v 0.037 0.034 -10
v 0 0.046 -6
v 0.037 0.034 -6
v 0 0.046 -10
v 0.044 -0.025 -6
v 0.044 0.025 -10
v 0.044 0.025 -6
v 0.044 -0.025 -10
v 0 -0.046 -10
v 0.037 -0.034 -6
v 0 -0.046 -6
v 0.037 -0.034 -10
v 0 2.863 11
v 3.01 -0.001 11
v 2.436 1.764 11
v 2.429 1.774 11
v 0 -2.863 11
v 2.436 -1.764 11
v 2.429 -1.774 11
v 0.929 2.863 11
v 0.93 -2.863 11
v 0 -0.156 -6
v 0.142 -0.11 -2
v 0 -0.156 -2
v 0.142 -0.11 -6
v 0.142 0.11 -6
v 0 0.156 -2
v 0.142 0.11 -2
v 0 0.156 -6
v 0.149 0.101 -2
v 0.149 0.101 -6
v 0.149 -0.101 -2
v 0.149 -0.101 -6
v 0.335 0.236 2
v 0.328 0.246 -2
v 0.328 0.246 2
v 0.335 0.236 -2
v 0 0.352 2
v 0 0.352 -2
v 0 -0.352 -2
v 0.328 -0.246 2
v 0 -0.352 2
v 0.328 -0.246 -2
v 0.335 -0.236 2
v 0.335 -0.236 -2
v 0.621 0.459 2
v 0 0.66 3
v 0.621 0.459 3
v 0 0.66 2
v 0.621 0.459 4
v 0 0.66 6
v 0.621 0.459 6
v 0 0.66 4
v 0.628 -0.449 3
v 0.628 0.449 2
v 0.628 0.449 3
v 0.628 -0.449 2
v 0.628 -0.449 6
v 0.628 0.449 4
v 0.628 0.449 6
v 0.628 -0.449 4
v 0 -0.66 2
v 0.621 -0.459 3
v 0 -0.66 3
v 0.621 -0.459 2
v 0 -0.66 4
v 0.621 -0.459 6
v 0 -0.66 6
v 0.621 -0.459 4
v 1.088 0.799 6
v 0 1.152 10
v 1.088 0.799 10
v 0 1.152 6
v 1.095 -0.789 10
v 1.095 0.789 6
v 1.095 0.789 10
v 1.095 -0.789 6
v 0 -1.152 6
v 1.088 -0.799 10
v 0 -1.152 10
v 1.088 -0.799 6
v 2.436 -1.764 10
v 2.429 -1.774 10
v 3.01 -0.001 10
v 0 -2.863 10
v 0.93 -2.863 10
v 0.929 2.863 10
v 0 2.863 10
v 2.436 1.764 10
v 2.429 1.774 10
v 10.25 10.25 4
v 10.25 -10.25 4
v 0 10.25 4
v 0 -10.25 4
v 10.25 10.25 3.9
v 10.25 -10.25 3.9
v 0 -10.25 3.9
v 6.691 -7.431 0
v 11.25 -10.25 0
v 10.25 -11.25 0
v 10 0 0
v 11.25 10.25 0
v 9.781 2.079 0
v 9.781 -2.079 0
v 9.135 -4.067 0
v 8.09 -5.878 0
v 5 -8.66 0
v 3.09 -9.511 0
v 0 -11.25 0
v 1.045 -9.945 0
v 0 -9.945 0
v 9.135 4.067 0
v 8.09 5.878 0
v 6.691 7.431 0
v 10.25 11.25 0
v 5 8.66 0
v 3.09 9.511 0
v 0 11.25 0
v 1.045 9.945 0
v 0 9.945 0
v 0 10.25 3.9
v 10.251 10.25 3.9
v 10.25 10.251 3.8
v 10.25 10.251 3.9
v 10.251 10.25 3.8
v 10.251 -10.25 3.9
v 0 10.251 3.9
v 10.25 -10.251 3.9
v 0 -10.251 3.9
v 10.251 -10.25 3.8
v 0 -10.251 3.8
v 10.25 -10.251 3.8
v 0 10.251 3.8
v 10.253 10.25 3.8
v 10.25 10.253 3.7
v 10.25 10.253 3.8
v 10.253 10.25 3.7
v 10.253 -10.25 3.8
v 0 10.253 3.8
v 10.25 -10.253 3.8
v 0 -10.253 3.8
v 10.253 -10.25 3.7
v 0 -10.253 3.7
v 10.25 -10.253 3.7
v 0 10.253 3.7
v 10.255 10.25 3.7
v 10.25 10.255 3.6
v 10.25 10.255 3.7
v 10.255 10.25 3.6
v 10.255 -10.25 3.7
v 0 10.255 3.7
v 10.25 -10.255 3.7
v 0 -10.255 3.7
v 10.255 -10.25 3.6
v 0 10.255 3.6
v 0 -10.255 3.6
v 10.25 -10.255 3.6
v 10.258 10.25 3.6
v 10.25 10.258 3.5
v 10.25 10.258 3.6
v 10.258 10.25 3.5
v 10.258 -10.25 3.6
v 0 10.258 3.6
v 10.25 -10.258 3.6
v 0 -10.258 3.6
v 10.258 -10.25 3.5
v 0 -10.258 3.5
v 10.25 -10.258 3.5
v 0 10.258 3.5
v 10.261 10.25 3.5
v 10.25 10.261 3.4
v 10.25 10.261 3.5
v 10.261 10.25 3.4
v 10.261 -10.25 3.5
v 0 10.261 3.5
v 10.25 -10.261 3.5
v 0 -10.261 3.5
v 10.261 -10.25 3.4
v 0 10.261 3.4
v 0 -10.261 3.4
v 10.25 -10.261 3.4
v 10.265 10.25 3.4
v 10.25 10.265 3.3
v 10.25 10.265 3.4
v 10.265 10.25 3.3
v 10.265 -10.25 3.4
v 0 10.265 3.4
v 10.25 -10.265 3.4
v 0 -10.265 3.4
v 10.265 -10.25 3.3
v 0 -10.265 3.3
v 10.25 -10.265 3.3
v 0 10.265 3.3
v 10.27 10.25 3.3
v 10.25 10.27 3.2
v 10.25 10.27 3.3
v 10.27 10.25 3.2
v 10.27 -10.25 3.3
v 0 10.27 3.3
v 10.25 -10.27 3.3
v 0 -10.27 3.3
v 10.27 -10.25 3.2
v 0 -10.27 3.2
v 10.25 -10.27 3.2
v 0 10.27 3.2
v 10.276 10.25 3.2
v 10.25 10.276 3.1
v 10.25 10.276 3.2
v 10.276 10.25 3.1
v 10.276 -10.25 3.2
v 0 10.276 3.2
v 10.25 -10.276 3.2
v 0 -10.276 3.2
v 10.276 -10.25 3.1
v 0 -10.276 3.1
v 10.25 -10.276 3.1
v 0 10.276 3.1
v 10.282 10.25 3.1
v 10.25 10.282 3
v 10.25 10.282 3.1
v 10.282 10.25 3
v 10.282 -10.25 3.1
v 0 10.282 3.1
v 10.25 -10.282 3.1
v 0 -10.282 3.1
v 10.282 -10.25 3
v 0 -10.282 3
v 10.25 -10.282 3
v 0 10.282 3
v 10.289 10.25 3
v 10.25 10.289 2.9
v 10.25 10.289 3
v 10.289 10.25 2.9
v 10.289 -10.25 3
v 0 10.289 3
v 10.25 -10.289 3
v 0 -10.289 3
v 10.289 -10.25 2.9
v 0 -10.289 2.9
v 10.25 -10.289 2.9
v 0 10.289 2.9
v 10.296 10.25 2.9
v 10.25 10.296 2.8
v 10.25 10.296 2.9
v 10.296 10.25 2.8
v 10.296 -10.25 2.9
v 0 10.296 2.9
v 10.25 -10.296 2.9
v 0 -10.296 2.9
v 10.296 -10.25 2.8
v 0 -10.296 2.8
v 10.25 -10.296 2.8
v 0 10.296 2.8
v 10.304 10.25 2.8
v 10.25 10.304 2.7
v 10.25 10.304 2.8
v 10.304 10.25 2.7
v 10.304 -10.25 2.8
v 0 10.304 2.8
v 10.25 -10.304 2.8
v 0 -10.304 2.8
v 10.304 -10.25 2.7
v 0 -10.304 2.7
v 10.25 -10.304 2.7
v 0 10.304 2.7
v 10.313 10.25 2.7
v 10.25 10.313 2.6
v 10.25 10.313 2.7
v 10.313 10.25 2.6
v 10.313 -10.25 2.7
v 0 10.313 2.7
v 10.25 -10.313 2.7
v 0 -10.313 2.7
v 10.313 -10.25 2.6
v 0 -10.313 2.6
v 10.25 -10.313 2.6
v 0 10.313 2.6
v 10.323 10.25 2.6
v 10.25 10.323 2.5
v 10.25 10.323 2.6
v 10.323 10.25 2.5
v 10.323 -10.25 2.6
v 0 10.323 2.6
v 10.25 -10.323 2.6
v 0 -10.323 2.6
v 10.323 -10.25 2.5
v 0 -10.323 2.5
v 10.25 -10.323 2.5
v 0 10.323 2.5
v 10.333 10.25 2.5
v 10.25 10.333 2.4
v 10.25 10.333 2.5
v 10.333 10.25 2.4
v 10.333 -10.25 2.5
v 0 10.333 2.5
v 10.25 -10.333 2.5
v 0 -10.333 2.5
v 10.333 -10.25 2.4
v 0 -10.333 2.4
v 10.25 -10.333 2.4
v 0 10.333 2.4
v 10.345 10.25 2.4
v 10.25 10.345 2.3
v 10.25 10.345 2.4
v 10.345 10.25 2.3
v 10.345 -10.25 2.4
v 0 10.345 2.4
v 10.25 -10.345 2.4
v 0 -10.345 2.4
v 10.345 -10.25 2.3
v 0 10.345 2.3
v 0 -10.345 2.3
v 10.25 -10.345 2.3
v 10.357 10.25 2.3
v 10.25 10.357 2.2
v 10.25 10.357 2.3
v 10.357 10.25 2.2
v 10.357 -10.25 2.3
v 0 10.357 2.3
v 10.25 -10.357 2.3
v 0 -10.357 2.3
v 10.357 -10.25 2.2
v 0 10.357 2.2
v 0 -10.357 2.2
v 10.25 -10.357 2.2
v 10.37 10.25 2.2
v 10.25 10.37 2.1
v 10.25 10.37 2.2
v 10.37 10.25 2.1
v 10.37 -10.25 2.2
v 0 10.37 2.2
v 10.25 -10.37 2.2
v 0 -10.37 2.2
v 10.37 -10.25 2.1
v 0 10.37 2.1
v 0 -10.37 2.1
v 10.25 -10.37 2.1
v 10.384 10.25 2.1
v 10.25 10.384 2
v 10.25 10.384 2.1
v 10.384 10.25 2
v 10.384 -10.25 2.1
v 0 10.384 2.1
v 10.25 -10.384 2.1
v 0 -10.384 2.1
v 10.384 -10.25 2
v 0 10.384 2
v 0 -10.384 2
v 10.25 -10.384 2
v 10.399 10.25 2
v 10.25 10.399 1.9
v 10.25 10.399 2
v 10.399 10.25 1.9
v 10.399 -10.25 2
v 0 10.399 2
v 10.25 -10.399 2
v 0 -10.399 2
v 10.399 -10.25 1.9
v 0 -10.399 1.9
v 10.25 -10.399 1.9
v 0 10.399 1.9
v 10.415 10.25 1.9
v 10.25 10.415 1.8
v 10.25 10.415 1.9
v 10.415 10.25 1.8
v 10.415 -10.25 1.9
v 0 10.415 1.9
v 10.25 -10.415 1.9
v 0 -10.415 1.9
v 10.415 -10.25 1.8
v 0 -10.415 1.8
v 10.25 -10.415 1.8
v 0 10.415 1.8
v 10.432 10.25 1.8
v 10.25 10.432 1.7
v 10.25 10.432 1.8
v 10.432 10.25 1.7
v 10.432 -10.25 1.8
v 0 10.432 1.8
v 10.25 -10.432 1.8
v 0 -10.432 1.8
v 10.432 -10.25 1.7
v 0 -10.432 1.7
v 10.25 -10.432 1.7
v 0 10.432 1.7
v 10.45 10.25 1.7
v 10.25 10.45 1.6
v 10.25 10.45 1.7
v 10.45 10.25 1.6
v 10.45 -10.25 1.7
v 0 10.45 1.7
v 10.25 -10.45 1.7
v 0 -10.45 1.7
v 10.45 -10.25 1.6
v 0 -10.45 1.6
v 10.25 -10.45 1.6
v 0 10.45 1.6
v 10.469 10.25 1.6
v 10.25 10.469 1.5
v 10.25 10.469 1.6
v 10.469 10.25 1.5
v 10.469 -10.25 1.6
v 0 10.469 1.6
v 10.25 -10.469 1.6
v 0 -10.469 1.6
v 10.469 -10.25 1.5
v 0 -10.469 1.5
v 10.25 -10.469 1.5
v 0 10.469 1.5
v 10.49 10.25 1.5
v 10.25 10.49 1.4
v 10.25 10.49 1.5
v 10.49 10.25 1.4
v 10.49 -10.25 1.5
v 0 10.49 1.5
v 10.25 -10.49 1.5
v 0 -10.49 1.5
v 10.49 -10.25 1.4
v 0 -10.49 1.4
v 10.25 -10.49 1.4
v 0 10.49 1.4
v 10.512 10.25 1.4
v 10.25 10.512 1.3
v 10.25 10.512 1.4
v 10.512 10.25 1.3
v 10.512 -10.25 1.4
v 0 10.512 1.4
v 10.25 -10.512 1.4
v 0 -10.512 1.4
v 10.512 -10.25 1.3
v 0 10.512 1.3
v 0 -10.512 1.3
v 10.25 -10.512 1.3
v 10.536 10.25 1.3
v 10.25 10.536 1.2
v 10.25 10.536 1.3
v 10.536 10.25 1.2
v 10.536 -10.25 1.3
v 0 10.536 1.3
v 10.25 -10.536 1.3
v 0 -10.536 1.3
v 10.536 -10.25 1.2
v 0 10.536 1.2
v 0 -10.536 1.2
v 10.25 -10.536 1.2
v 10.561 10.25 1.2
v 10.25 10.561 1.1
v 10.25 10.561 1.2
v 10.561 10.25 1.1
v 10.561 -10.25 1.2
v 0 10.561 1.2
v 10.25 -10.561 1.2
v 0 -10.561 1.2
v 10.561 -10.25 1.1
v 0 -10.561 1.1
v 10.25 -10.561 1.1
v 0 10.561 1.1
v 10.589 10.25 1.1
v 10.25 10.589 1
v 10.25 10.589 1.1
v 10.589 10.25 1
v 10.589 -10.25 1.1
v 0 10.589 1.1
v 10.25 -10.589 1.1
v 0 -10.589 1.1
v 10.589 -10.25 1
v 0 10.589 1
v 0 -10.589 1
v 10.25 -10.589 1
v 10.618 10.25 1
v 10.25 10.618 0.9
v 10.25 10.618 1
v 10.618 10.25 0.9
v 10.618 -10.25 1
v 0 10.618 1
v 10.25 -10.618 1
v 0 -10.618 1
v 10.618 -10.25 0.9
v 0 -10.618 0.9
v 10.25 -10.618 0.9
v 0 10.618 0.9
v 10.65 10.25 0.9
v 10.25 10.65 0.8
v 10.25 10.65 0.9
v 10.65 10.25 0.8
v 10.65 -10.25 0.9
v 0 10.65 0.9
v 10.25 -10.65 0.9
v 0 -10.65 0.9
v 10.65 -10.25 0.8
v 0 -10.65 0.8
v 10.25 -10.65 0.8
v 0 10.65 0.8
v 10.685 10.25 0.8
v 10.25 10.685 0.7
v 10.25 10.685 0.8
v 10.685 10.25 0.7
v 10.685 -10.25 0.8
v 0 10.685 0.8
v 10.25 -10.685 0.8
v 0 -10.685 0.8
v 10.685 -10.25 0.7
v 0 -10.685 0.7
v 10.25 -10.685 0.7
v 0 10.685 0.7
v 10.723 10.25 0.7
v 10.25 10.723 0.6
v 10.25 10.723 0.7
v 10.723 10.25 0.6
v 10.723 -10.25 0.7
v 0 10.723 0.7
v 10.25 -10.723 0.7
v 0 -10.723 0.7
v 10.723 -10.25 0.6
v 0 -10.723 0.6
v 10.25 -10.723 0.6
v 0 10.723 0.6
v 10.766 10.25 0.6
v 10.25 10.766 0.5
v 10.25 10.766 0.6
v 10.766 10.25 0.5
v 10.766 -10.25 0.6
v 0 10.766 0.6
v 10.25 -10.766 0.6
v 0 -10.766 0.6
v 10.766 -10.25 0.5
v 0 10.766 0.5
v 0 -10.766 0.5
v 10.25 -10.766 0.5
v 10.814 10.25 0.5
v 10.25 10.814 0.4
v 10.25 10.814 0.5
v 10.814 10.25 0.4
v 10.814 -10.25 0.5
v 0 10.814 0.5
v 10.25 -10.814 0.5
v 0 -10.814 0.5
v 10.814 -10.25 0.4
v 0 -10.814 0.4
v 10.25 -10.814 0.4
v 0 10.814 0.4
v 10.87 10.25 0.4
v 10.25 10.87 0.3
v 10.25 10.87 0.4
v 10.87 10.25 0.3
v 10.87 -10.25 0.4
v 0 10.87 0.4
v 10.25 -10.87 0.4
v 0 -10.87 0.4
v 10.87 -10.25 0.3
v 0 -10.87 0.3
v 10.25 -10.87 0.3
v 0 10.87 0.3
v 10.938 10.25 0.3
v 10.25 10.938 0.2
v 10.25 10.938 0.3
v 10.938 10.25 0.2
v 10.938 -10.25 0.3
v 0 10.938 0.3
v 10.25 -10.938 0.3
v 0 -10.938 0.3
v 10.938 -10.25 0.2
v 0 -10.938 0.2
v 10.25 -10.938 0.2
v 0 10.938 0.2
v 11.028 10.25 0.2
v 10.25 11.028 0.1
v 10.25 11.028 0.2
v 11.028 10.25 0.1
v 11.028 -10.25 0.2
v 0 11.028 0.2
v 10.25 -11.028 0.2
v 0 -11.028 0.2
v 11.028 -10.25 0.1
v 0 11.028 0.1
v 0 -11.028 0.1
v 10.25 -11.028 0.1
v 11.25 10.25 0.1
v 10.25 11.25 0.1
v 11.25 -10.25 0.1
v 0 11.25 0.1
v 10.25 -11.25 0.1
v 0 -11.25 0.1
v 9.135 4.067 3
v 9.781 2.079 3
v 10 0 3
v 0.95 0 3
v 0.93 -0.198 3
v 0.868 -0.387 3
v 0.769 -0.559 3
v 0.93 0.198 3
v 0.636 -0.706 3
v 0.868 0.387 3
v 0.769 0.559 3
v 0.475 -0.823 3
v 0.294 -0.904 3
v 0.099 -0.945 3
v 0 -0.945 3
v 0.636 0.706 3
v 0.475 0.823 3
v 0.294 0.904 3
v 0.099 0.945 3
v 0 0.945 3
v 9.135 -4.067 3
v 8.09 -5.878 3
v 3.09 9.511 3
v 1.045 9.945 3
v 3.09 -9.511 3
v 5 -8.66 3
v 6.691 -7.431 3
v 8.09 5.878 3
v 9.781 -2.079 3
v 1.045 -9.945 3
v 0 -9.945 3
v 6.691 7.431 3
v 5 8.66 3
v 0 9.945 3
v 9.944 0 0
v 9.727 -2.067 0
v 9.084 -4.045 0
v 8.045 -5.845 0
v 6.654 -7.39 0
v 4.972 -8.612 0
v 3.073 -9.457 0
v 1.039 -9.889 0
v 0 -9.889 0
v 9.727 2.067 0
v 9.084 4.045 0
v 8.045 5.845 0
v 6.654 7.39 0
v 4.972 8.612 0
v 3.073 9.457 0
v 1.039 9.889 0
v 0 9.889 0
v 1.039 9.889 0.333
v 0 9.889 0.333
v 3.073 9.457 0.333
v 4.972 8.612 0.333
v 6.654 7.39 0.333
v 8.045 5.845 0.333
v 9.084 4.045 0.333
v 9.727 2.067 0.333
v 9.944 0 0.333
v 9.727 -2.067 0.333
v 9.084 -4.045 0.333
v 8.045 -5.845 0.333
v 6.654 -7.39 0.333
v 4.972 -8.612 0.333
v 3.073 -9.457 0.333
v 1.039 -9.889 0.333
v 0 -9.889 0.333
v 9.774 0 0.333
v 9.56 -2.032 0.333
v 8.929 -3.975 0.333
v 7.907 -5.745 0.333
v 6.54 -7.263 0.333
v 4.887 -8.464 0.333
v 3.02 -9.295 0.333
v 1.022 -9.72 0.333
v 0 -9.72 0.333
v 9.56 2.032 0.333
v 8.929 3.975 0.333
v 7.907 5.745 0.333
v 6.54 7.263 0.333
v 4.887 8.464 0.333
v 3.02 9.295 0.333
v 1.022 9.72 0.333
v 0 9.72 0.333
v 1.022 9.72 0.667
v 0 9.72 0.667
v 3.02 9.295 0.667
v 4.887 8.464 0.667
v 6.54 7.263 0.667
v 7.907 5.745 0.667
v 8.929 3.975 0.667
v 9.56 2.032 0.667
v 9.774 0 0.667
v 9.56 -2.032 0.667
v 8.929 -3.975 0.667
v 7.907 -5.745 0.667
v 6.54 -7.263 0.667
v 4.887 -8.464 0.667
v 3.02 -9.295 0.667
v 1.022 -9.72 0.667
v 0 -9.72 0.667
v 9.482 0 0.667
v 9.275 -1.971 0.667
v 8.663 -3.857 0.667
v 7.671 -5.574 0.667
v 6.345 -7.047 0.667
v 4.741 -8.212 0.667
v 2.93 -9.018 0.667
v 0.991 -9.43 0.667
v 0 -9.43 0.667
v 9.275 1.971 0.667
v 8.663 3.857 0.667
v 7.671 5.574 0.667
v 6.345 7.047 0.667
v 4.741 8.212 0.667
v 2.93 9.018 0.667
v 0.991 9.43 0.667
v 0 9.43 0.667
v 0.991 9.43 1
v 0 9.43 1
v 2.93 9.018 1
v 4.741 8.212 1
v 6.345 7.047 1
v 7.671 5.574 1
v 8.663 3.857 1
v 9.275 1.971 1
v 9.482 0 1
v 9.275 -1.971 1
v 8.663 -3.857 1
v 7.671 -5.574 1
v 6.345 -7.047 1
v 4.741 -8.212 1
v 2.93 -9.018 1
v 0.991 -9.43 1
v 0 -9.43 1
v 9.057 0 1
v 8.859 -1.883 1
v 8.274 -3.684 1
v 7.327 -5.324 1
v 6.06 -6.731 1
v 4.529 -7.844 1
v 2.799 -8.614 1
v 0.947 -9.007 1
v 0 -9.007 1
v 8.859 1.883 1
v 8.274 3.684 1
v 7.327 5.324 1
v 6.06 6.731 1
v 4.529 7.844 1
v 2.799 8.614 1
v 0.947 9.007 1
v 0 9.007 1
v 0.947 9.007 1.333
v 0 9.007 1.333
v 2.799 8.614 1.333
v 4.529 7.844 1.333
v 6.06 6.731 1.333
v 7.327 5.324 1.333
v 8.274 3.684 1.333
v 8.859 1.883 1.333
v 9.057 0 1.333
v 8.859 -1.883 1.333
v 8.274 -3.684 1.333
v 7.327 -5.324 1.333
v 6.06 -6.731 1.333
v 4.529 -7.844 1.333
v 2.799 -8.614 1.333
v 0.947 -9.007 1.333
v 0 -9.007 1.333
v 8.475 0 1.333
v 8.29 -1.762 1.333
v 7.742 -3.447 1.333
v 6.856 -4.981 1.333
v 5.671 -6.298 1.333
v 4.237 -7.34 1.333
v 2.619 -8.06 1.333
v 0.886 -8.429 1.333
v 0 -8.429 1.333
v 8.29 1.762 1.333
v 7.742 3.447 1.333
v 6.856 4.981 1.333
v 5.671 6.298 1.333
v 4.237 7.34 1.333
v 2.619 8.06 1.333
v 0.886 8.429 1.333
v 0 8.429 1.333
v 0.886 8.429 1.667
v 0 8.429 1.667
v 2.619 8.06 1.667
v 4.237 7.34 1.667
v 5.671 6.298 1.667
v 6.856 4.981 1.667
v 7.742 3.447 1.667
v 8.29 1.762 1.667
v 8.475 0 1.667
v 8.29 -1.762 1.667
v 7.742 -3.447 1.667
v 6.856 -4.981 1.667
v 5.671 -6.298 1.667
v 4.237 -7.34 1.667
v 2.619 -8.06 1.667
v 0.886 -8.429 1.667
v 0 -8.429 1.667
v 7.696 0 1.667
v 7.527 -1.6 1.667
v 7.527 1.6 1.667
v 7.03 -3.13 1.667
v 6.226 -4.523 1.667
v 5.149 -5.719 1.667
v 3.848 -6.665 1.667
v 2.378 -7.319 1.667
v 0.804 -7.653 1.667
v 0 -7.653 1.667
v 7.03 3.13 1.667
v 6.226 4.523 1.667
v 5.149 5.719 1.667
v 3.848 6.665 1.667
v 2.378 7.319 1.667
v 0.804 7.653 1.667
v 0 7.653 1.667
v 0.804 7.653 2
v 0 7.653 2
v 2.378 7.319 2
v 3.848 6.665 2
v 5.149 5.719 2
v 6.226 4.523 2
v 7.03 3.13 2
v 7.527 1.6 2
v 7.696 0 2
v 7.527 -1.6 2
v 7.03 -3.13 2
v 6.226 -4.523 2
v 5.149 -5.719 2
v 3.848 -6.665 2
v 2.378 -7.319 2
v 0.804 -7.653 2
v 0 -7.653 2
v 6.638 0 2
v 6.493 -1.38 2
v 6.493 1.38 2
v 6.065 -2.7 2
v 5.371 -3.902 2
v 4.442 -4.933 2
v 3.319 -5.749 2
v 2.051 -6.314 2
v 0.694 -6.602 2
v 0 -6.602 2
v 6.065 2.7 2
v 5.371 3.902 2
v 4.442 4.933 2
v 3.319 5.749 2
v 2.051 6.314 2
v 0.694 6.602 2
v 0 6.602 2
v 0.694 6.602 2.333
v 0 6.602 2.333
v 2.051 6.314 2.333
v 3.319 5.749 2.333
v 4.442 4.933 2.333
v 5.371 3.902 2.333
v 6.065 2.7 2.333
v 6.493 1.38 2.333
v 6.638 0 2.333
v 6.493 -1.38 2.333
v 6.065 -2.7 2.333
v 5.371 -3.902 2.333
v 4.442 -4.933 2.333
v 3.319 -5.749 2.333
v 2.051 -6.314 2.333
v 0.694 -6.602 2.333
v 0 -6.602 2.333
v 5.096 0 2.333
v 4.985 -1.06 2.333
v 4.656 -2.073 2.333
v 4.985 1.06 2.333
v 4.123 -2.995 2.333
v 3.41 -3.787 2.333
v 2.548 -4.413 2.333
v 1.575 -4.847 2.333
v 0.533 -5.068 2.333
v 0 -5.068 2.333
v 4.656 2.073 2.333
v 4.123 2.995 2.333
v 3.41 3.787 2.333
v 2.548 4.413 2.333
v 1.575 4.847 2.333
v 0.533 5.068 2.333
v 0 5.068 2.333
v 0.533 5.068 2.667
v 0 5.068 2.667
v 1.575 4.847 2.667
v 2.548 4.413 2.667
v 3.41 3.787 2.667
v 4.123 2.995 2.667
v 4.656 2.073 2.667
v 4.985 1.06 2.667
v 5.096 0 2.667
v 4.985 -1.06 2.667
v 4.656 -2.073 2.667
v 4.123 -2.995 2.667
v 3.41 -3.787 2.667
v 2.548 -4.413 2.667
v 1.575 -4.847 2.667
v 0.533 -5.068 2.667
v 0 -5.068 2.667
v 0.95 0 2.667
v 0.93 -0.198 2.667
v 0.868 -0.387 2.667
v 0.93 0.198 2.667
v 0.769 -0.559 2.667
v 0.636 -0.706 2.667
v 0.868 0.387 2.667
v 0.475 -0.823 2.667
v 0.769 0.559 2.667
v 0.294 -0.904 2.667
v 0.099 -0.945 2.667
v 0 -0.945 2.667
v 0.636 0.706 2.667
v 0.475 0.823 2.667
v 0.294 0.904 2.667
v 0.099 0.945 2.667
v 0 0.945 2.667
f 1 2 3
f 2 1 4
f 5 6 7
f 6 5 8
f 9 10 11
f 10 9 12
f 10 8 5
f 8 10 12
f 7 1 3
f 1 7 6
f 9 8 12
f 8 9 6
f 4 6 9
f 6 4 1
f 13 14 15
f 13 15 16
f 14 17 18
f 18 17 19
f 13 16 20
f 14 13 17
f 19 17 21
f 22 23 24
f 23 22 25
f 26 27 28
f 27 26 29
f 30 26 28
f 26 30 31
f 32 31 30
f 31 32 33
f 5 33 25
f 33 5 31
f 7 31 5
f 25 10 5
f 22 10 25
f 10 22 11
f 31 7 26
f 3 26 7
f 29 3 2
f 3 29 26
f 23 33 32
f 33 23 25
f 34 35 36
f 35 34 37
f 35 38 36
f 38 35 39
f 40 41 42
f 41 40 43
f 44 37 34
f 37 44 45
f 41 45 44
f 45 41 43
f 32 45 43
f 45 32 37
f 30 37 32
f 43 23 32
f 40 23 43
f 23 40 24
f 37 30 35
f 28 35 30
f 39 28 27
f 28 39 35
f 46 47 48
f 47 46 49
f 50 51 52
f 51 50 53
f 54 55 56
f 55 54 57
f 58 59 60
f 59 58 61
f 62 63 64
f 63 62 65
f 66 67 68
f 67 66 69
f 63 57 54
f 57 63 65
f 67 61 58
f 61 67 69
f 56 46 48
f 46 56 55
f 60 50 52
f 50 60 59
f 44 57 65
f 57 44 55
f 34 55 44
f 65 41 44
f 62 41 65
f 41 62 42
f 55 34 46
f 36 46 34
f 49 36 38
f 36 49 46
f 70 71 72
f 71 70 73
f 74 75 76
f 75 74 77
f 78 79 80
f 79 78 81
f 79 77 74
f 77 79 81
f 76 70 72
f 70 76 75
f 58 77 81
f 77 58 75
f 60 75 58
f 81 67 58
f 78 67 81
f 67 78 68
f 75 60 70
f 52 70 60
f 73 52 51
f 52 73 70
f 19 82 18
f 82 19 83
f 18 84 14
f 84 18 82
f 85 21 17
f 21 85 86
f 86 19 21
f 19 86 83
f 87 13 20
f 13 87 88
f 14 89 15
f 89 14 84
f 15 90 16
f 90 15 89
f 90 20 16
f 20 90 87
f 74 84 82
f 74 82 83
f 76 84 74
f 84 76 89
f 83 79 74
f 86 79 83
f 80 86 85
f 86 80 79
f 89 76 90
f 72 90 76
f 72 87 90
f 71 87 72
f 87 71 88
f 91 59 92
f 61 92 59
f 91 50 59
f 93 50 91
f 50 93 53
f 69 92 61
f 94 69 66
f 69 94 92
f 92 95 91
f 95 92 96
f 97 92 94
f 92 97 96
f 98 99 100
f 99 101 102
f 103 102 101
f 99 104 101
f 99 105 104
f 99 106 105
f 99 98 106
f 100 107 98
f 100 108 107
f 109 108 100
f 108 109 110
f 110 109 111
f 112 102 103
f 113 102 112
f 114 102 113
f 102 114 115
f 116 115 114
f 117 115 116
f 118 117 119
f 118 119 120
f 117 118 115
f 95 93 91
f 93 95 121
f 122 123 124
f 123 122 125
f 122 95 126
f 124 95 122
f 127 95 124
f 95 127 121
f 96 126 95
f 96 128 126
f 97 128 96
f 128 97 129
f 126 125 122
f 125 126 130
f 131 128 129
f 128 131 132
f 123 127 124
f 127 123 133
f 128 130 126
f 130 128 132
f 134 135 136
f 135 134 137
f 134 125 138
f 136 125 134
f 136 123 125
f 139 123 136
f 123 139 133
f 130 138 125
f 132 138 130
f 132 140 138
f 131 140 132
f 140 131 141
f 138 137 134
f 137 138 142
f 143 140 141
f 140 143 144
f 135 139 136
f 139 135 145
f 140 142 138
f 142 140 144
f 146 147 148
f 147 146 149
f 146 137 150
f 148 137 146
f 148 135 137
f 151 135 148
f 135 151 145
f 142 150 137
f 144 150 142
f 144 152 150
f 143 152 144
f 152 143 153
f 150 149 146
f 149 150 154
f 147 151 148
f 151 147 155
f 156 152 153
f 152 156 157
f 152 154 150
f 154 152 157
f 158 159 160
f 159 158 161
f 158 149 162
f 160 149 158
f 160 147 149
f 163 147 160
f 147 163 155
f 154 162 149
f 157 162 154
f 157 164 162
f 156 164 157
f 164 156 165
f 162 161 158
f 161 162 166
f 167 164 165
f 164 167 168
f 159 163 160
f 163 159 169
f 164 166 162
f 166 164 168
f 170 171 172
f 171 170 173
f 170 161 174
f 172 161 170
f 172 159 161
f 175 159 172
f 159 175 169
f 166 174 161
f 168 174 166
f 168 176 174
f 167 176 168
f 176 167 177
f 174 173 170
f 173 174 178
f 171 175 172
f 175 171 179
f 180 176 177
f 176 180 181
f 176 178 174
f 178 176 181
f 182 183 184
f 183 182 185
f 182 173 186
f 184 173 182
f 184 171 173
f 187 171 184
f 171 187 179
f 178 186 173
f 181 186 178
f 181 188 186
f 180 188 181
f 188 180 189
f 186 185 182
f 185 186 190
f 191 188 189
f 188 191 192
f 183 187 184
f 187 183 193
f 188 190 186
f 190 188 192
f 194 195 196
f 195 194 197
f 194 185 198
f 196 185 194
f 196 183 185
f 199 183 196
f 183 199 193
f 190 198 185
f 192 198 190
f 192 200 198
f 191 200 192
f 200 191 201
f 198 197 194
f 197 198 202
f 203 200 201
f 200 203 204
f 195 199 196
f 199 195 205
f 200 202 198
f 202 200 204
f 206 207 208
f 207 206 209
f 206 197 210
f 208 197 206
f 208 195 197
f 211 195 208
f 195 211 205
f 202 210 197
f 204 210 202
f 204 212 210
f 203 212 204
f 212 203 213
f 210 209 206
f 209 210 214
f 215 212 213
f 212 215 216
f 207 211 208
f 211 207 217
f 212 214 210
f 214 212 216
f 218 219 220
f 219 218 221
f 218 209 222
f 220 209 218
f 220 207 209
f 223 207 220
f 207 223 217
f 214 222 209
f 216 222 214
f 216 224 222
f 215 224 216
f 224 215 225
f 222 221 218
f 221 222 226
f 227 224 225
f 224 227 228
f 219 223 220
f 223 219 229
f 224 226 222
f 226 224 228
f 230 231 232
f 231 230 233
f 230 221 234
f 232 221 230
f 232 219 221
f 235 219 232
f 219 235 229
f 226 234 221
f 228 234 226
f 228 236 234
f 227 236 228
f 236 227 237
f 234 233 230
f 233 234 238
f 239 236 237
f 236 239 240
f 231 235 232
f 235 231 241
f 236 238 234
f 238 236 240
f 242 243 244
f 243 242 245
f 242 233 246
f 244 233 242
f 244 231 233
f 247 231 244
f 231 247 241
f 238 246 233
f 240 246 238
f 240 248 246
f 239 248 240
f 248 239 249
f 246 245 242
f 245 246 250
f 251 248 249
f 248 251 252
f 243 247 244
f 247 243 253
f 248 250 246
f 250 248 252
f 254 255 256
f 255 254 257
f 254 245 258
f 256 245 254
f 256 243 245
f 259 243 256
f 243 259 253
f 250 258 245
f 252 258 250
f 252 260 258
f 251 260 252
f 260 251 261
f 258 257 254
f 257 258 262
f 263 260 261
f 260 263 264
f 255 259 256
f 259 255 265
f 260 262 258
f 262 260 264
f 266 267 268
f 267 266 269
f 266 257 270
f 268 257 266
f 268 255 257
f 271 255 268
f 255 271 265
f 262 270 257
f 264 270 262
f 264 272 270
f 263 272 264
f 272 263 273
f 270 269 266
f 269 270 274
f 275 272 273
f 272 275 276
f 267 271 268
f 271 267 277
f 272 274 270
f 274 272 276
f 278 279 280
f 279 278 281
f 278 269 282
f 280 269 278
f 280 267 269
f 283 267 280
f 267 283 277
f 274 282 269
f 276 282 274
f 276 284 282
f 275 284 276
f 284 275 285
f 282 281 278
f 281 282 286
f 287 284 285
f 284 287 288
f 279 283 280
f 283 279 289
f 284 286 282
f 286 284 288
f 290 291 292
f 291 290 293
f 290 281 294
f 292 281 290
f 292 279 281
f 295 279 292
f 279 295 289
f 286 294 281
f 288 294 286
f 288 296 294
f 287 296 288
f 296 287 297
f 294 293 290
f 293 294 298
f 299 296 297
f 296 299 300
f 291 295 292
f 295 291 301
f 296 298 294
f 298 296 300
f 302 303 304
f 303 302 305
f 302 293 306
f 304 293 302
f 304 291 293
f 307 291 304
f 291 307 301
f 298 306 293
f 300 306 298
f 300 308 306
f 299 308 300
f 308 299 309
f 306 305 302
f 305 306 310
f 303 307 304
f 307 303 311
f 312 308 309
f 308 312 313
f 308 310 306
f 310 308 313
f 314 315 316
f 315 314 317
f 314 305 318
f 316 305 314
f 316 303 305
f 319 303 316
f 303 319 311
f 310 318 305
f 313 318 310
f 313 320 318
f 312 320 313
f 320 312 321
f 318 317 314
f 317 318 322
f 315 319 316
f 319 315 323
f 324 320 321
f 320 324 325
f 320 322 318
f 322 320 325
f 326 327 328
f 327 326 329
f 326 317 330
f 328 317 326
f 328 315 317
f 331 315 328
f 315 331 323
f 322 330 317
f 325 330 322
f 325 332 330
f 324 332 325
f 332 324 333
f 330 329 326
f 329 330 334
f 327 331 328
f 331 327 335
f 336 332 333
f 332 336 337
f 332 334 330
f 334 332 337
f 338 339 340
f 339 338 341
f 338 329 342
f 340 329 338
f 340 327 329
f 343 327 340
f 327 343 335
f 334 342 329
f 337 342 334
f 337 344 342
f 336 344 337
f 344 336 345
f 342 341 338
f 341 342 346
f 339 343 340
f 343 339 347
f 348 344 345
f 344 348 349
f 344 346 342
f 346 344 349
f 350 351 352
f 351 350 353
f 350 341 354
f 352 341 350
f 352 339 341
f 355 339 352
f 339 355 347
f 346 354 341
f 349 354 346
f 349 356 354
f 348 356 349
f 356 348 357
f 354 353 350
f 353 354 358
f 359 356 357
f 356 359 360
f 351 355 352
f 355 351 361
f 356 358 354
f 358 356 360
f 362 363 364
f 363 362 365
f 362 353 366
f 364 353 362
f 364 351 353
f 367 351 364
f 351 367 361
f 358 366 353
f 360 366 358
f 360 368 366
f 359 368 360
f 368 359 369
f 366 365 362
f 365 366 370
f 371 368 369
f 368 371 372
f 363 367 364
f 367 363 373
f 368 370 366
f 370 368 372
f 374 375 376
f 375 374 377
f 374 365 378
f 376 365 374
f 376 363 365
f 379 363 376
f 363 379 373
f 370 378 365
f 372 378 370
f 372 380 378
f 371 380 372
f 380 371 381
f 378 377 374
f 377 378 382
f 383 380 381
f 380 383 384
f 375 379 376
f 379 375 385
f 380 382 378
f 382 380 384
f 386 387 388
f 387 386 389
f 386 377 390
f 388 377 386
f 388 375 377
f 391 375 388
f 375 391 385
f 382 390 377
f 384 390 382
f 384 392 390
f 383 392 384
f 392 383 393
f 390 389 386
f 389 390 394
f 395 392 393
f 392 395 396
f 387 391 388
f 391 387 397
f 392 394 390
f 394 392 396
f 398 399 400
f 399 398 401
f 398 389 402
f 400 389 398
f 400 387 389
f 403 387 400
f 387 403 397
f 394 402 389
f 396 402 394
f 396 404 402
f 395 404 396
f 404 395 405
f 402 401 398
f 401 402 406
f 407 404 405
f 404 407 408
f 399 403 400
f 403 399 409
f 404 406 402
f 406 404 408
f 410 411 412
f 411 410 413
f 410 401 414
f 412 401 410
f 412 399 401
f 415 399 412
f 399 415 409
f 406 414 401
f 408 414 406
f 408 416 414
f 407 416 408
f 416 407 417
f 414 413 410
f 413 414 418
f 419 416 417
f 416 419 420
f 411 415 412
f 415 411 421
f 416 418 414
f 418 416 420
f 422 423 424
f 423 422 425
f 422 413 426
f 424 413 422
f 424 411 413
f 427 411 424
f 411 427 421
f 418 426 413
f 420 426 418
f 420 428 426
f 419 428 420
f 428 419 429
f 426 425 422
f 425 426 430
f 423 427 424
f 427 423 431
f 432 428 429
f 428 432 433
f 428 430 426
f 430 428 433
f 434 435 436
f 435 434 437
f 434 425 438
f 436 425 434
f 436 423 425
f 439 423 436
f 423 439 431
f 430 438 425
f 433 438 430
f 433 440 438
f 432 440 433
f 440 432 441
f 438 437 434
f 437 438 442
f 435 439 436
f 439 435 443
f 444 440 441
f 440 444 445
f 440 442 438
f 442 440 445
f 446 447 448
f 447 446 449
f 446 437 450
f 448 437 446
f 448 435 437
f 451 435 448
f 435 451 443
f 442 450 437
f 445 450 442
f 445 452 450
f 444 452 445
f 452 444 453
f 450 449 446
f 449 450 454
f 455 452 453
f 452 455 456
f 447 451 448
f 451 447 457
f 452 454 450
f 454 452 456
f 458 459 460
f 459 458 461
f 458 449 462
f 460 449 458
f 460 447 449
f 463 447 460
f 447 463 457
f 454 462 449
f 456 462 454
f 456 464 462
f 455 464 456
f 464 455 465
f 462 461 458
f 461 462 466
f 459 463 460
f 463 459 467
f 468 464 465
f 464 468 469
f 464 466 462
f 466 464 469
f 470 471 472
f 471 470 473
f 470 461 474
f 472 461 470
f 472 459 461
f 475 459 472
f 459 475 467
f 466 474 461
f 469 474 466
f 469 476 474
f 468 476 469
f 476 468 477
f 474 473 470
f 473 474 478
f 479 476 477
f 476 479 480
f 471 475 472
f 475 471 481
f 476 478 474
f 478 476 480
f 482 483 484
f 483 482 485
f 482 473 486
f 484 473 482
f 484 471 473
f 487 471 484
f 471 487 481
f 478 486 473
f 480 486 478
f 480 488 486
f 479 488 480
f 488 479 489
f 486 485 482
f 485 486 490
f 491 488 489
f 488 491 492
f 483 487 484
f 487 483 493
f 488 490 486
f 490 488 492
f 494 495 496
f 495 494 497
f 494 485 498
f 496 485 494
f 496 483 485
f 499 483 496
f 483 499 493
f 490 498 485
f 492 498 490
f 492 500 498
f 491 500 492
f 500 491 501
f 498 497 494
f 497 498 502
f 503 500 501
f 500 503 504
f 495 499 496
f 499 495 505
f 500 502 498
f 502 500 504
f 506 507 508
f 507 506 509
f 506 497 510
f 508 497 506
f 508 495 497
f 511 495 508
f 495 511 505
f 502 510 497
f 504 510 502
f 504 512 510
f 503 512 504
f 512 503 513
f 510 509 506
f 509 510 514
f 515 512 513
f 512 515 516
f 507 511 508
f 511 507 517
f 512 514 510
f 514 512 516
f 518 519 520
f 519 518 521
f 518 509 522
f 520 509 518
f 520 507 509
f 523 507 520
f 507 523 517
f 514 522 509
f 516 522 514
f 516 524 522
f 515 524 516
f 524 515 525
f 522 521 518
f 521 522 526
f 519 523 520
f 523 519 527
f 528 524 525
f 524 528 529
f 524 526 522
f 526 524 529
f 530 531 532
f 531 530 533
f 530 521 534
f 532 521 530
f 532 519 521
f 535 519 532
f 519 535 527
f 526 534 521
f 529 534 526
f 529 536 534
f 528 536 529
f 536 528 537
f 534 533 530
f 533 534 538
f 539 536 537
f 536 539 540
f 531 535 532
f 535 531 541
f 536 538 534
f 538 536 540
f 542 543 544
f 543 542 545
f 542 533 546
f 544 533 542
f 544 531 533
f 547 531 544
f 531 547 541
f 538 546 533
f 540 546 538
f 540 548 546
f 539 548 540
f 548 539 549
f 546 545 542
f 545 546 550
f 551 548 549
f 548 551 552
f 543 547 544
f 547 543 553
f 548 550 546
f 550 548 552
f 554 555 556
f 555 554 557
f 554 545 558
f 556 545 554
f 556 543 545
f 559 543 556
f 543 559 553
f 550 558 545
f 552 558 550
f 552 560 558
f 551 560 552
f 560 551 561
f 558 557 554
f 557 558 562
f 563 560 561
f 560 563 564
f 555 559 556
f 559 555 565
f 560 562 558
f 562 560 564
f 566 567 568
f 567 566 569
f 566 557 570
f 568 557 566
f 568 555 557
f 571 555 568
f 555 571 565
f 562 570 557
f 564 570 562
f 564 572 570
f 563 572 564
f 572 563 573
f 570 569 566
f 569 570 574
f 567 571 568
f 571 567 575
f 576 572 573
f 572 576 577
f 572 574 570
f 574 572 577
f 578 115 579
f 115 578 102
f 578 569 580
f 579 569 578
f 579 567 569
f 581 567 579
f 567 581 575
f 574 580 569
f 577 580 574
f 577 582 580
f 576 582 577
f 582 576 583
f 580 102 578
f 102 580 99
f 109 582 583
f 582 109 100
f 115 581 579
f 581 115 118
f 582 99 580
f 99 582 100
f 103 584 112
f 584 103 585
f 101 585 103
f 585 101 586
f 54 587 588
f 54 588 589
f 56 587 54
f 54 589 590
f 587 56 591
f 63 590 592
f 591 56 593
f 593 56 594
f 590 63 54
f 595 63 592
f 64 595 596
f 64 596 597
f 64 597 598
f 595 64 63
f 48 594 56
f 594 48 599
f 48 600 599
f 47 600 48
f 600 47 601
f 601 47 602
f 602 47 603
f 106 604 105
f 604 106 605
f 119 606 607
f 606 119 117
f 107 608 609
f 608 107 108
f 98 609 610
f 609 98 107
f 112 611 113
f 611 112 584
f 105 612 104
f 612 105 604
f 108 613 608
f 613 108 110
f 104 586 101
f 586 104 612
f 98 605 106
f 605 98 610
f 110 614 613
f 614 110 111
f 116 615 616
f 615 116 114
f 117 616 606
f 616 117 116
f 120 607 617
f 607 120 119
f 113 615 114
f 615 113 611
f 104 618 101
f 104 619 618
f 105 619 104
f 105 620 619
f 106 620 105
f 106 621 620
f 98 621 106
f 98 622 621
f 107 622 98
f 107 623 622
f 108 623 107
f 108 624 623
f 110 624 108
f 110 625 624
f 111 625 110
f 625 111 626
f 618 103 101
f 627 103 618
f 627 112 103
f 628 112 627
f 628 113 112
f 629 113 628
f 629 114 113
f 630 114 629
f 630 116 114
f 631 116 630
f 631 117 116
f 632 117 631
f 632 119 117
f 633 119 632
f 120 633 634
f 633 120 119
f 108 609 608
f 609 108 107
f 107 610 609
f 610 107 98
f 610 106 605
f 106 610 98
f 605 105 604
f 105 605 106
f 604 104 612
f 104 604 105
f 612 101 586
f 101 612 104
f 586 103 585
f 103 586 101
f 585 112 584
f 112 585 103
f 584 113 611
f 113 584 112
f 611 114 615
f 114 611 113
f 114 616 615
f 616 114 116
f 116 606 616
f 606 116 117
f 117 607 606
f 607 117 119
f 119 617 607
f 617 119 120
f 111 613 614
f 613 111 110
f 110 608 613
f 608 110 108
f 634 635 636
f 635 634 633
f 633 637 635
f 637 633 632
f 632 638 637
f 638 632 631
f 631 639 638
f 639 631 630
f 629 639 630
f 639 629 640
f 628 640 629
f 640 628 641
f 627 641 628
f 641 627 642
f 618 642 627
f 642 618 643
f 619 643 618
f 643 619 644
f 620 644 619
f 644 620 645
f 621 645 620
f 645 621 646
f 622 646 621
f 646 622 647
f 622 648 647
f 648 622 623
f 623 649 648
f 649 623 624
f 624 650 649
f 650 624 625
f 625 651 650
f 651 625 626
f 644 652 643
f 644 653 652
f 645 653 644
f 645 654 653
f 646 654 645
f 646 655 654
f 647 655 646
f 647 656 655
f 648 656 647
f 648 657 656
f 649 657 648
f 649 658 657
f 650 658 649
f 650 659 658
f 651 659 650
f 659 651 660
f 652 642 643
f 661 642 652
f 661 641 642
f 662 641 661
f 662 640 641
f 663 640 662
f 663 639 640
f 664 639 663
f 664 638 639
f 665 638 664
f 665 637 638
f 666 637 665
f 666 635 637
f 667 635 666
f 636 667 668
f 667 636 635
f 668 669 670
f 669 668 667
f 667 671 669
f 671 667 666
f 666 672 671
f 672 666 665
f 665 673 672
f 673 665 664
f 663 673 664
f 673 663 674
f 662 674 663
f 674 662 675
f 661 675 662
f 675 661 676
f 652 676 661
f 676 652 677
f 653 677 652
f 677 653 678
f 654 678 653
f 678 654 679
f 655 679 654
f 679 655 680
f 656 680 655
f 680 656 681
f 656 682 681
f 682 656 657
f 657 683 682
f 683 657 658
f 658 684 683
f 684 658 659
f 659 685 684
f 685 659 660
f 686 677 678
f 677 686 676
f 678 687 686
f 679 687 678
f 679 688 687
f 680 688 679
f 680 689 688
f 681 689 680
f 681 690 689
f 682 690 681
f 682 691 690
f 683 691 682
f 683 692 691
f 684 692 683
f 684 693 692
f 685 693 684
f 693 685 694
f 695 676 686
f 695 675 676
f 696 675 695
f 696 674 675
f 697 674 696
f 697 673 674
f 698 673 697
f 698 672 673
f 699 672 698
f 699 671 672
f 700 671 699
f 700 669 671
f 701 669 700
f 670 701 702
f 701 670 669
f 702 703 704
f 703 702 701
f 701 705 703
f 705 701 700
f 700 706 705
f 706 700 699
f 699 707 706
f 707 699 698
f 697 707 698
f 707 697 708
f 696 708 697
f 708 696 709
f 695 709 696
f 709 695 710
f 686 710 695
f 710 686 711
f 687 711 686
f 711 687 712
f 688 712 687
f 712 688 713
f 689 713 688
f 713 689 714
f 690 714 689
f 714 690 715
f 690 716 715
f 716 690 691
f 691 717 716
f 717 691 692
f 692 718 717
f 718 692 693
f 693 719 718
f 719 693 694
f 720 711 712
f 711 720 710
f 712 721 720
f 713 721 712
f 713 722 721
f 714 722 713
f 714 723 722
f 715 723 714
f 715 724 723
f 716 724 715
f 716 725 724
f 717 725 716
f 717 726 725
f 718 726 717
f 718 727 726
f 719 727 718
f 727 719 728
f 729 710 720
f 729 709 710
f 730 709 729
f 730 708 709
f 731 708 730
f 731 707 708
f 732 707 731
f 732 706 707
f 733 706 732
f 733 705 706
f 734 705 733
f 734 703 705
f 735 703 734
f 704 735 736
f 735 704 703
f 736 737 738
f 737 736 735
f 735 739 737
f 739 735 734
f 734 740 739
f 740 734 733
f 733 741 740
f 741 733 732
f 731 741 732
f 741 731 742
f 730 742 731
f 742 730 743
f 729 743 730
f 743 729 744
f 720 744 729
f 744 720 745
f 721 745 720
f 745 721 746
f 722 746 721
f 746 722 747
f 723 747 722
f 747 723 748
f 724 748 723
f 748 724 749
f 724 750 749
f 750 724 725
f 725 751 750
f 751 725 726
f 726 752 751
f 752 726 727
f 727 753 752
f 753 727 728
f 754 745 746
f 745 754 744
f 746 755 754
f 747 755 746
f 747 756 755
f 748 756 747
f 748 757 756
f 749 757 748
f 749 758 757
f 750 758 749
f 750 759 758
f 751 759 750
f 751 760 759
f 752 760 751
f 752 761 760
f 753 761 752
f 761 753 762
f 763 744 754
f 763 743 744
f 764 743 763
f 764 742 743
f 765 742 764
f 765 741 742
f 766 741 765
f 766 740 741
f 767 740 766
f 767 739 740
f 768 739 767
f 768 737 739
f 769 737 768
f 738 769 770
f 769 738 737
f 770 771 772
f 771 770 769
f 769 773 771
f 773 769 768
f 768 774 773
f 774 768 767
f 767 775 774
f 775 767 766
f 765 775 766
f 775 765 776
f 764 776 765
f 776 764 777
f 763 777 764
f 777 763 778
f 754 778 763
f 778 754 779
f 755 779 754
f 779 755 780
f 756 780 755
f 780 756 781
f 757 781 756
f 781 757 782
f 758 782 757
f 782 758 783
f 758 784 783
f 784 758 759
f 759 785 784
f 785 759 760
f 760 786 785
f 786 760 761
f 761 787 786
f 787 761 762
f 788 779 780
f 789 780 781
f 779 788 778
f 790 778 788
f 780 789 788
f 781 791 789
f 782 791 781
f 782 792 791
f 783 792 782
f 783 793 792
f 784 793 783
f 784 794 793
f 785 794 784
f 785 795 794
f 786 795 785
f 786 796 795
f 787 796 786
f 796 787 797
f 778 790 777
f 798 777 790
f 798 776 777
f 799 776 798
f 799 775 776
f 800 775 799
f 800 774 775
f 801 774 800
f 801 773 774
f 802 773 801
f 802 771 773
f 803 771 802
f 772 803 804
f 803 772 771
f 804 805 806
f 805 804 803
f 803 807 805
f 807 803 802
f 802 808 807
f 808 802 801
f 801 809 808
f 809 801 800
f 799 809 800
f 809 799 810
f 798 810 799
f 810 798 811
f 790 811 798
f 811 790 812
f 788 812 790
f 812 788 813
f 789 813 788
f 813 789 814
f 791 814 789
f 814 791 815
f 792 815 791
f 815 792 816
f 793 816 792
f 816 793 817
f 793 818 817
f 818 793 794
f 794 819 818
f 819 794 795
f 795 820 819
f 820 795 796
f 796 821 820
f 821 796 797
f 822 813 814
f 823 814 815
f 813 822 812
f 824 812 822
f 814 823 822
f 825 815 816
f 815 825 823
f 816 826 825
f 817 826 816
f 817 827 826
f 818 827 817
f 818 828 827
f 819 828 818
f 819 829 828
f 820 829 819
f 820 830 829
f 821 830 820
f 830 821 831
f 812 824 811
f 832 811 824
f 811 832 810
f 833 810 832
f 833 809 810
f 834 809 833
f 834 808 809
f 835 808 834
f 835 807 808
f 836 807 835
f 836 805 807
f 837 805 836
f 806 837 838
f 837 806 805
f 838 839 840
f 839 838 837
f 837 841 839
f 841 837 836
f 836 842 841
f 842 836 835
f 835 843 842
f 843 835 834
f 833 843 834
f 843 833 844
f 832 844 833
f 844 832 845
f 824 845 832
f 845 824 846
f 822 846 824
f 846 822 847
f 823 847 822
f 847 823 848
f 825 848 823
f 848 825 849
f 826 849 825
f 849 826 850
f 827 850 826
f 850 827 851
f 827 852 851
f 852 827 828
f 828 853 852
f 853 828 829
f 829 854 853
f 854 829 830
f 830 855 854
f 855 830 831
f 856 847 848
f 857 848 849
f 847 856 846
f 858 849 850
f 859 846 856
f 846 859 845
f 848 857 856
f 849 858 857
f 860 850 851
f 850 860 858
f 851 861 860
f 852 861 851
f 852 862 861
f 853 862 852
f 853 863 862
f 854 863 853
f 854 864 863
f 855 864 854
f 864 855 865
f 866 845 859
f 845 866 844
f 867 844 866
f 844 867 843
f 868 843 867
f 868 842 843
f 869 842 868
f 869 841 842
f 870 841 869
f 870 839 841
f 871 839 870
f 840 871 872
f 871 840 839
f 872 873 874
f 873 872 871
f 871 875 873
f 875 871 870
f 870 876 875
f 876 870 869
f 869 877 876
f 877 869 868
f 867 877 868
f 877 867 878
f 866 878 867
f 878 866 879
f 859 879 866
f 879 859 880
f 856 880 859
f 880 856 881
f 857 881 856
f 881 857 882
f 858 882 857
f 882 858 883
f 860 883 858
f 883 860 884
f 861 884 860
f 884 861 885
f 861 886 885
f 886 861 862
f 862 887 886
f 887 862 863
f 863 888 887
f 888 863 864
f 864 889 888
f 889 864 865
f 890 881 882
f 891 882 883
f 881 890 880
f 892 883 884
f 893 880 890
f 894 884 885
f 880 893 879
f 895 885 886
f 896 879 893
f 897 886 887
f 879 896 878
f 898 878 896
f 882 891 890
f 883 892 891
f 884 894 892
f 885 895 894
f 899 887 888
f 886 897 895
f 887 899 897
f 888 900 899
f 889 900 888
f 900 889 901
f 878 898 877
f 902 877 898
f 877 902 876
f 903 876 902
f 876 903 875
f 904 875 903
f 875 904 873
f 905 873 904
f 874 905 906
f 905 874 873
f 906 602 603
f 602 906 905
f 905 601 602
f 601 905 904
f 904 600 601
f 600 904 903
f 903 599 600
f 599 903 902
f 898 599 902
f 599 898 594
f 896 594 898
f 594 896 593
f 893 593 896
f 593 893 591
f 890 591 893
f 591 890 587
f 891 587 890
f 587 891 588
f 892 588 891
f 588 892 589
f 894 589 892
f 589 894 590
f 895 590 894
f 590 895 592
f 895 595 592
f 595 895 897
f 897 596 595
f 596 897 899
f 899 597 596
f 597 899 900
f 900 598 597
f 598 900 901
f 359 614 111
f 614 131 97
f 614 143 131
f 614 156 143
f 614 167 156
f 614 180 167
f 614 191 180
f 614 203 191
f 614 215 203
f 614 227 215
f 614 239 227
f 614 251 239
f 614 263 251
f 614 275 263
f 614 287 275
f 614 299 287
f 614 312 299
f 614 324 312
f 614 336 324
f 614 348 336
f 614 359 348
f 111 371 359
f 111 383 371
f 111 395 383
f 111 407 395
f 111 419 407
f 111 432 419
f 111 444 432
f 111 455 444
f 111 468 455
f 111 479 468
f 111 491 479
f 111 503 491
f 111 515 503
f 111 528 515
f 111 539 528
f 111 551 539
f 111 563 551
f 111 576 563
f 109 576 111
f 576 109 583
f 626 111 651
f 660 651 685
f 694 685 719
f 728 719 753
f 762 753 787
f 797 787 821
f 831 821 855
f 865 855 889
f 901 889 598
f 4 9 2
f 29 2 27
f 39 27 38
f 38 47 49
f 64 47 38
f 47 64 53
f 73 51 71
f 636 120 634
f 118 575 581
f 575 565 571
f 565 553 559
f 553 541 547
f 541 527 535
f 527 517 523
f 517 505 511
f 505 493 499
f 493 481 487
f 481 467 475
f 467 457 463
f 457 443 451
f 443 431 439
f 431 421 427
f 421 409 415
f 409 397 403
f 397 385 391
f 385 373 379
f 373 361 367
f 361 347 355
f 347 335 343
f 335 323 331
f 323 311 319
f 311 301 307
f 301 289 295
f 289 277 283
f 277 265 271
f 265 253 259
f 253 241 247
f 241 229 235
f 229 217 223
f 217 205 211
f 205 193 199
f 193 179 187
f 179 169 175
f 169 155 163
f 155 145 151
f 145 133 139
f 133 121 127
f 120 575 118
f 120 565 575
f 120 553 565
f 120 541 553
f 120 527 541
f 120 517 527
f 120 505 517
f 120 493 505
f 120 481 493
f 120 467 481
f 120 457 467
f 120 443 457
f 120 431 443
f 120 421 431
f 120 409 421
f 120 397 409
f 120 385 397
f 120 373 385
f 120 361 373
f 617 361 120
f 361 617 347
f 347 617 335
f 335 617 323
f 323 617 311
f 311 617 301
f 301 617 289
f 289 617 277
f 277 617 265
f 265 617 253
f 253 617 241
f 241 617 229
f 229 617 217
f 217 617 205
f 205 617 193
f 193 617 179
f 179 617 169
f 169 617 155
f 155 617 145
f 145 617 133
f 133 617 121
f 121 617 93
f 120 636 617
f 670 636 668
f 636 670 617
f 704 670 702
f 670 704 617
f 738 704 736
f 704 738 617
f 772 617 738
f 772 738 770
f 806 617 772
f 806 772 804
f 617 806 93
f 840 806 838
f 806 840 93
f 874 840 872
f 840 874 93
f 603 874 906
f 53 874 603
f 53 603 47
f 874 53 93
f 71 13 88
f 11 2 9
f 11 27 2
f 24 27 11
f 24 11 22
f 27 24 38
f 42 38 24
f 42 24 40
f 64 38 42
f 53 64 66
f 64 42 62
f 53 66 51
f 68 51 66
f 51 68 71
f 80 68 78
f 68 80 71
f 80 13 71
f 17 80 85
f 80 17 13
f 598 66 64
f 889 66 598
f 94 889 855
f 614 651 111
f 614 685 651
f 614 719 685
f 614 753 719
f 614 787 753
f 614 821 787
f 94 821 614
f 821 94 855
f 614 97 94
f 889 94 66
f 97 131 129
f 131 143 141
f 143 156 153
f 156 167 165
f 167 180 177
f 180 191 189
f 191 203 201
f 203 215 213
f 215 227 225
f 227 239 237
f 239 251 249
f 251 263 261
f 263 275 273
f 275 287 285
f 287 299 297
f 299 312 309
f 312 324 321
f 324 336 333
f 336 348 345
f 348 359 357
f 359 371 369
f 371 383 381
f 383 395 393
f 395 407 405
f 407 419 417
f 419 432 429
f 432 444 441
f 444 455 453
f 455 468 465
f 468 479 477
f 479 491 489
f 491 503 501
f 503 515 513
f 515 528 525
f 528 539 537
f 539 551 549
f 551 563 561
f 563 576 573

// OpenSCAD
intersection() {
    union() {
        translate(v=[0, 0, 11]) {
            union() {
                translate(v=[0, 0, -21]) {
                    linear_extrude(height=21) {
                        offset(r=0.041960108450191935) {
                            circle(r=0.01);
                        };
                    };
                };
                translate(v=[0, 0, -17]) {
                    linear_extrude(height=17) {
                        offset(r=0.17157287525380993) {
                            circle(r=0.01);
                        };
                    };
                };
                translate(v=[0, 0, -13]) {
                    linear_extrude(height=13) {
                        offset(r=0.4019237886466842) {
                            circle(r=0.01);
                        };
                    };
                };
                translate(v=[0, 0, -9]) {
                    linear_extrude(height=9) {
                        offset(r=0.7639320225002103) {
                            circle(r=0.01);
                        };
                    };
                };
                translate(v=[0, 0, -5]) {
                    linear_extrude(height=5) {
                        offset(r=1.3416876048223) {
                            circle(r=0.01);
                        };
                    };
                };
                translate(v=[0, 0, -1]) {
                    linear_extrude(height=1) {
                        offset(r=3) {
                            circle(r=0.01);
                        };
                    };
                };
            };
        };
        difference() {
            union() {
                linear_extrude(height=4) {
                    offset(r=0.000312548843389715) {
                        square(size=[20.5, 20.5], center=true);
                    };
                };
                linear_extrude(height=3.9) {
                    offset(r=0.0012507822280910519) {
                        square(size=[20.5, 20.5], center=true);
                    };
                };
                linear_extrude(height=3.8) {
                    offset(r=0.0028164662410434804) {
                        square(size=[20.5, 20.5], center=true);
                    };
                };
                linear_extrude(height=3.7) {
                    offset(r=0.005012562893380035) {
                        square(size=[20.5, 20.5], center=true);
                    };
                };
                linear_extrude(height=3.6) {
                    offset(r=0.007843258350778481) {
                        square(size=[20.5, 20.5], center=true);
                    };
                };
                linear_extrude(height=3.5) {
                    offset(r=0.011314003335740508) {
                        square(size=[20.5, 20.5], center=true);
                    };
                };
                linear_extrude(height=3.4) {
                    offset(r=0.015431566624239168) {
                        square(size=[20.5, 20.5], center=true);
                    };
                };
                linear_extrude(height=3.3) {
                    offset(r=0.020204102886728803) {
                        square(size=[20.5, 20.5], center=true);
                    };
                };
                linear_extrude(height=3.2) {
                    offset(r=0.025641236504746145) {
                        square(size=[20.5, 20.5], center=true);
                    };
                };
                linear_extrude(height=3.1) {
                    offset(r=0.031754163448145745) {
                        square(size=[20.5, 20.5], center=true);
                    };
                };
                linear_extrude(height=3) {
                    offset(r=0.038555773848529484) {
                        square(size=[20.5, 20.5], center=true);
                    };
                };
                linear_extrude(height=2.9) {
                    offset(r=0.04606079858305434) {
                        square(size=[20.5, 20.5], center=true);
                    };
                };
                linear_extrude(height=2.8) {
                    offset(r=0.054285984031113066) {
                        square(size=[20.5, 20.5], center=true);
                    };
                };
                linear_extrude(height=2.7) {
                    offset(r=0.06325030024024025) {
                        square(size=[20.5, 20.5], center=true);
                    };
                };
                linear_extrude(height=2.5999999999999996) {
                    offset(r=0.07297518911304213) {
                        square(size=[20.5, 20.5], center=true);
                    };
                };
                linear_extrude(height=2.5) {
                    offset(r=0.08348486100883201) {
                        square(size=[20.5, 20.5], center=true);
                    };
                };
                linear_extrude(height=2.4) {
                    offset(r=0.09480665048841641) {
                        square(size=[20.5, 20.5], center=true);
                    };
                };
                linear_extrude(height=2.3) {
                    offset(r=0.10697144502541245) {
                        square(size=[20.5, 20.5], center=true);
                    };
                };
                linear_extrude(height=2.2) {
                    offset(r=0.12001420466009793) {
                        square(size=[20.5, 20.5], center=true);
                    };
                };
                linear_extrude(height=2.0999999999999996) {
                    offset(r=0.1339745962155614) {
                        square(size=[20.5, 20.5], center=true);
                    };
                };
                linear_extrude(height=2) {
                    offset(r=0.14889777347253996) {
                        square(size=[20.5, 20.5], center=true);
                    };
                };
                linear_extrude(height=1.9) {
                    offset(r=0.16483534557549673) {
                        square(size=[20.5, 20.5], center=true);
                    };
                };
                linear_extrude(height=1.7999999999999998) {
                    offset(r=0.1818465914023214) {
                        square(size=[20.5, 20.5], center=true);
                    };
                };
                linear_extrude(height=1.6999999999999997) {
                    offset(r=0.19999999999999996) {
                        square(size=[20.5, 20.5], center=true);
                    };
                };
                linear_extrude(height=1.5999999999999996) {
                    offset(r=0.2193752502002002) {
                        square(size=[20.5, 20.5], center=true);
                    };
                };
                linear_extrude(height=1.5) {
                    offset(r=0.24006579232146685) {
                        square(size=[20.5, 20.5], center=true);
                    };
                };
                linear_extrude(height=1.4) {
                    offset(r=0.2621822718313147) {
                        square(size=[20.5, 20.5], center=true);
                    };
                };
                linear_extrude(height=1.2999999999999998) {
                    offset(r=0.285857157145715) {
                        square(size=[20.5, 20.5], center=true);
                    };
                };
                linear_extrude(height=1.1999999999999997) {
                    offset(r=0.3112511343022044) {
                        square(size=[20.5, 20.5], center=true);
                    };
                };
                linear_extrude(height=1.0999999999999996) {
                    offset(r=0.3385621722338523) {
                        square(size=[20.5, 20.5], center=true);
                    };
                };
                linear_extrude(height=1) {
                    offset(r=0.3680387670117732) {
                        square(size=[20.5, 20.5], center=true);
                    };
                };
                linear_extrude(height=0.8999999999999999) {
                    offset(r=0.40000000000000013) {
                        square(size=[20.5, 20.5], center=true);
                    };
                };
                linear_extrude(height=0.7999999999999998) {
                    offset(r=0.43486727222713417) {
                        square(size=[20.5, 20.5], center=true);
                    };
                };
                linear_extrude(height=0.6999999999999997) {
                    offset(r=0.473217312357363) {
                        square(size=[20.5, 20.5], center=true);
                    };
                };
                linear_extrude(height=0.5999999999999996) {
                    offset(r=0.5158770817240729) {
                        square(size=[20.5, 20.5], center=true);
                    };
                };
                linear_extrude(height=0.5) {
                    offset(r=0.5641101056459328) {
                        square(size=[20.5, 20.5], center=true);
                    };
                };
                linear_extrude(height=0.3999999999999999) {
                    offset(r=0.6200328961607335) {
                        square(size=[20.5, 20.5], center=true);
                    };
                };
                linear_extrude(height=0.2999999999999998) {
                    offset(r=0.6877501000800801) {
                        square(size=[20.5, 20.5], center=true);
                    };
                };
                linear_extrude(height=0.19999999999999973) {
                    offset(r=0.7777951395671101) {
                        square(size=[20.5, 20.5], center=true);
                    };
                };
                linear_extrude(height=0.09999999999999964) {
                    offset(r=1) {
                        square(size=[20.5, 20.5], center=true);
                    };
                };
            };
            linear_extrude(height=3) {
                circle(r=10);
            };
        };
        translate(v=[0, 0, 3]) {
            union() {
                translate(v=[0, 0, -3]) {
                    linear_extrude(height=3) {
                        difference() {
                            offset(r=0) {
                                circle(r=10);
                            };
                            offset(r=-0.05572809000084156) {
                                circle(r=10);
                            };
                        };
                    };
                };
                translate(v=[0, 0, -2.6666666666666665]) {
                    linear_extrude(height=2.6666666666666665) {
                        difference() {
                            offset(r=-0.05572809000084156) {
                                circle(r=10);
                            };
                            offset(r=-0.22503561260787786) {
                                circle(r=10);
                            };
                        };
                    };
                };
                translate(v=[0, 0, -2.3333333333333335]) {
                    linear_extrude(height=2.3333333333333335) {
                        difference() {
                            offset(r=-0.22503561260787786) {
                                circle(r=10);
                            };
                            offset(r=-0.5147186257614298) {
                                circle(r=10);
                            };
                        };
                    };
                };
                translate(v=[0, 0, -2]) {
                    linear_extrude(height=2) {
                        difference() {
                            offset(r=-0.5147186257614298) {
                                circle(r=10);
                            };
                            offset(r=-0.9377422517014505) {
                                circle(r=10);
                            };
                        };
                    };
                };
                translate(v=[0, 0, -1.6666666666666667]) {
                    linear_extrude(height=1.6666666666666667) {
                        difference() {
                            offset(r=-0.9377422517014505) {
                                circle(r=10);
                            };
                            offset(r=-1.5166852264521171) {
                                circle(r=10);
                            };
                        };
                    };
                };
                translate(v=[0, 0, -1.3333333333333335]) {
                    linear_extrude(height=1.3333333333333335) {
                        difference() {
                            offset(r=-1.5166852264521171) {
                                circle(r=10);
                            };
                            offset(r=-2.291796067500631) {
                                circle(r=10);
                            };
                        };
                    };
                };
                translate(v=[0, 0, -1]) {
                    linear_extrude(height=1) {
                        difference() {
                            offset(r=-2.291796067500631) {
                                circle(r=10);
                            };
                            offset(r=-3.3431457505076203) {
                                circle(r=10);
                            };
                        };
                    };
                };
                translate(v=[0, 0, -0.666666666666667]) {
                    linear_extrude(height=0.666666666666667) {
                        difference() {
                            offset(r=-3.3431457505076203) {
                                circle(r=10);
                            };
                            offset(r=-4.876894374382339) {
                                circle(r=10);
                            };
                        };
                    };
                };
                translate(v=[0, 0, -0.3333333333333335]) {
                    linear_extrude(height=0.3333333333333335) {
                        difference() {
                            offset(r=-4.876894374382339) {
                                circle(r=10);
                            };
                            offset(r=-9) {
                                circle(r=10);
                            };
                        };
                    };
                };
            };
        };
    };
    translate(v=[50, 0, 0]) {
        cube(size=[100, 100, 100], center=true);
    };
};
